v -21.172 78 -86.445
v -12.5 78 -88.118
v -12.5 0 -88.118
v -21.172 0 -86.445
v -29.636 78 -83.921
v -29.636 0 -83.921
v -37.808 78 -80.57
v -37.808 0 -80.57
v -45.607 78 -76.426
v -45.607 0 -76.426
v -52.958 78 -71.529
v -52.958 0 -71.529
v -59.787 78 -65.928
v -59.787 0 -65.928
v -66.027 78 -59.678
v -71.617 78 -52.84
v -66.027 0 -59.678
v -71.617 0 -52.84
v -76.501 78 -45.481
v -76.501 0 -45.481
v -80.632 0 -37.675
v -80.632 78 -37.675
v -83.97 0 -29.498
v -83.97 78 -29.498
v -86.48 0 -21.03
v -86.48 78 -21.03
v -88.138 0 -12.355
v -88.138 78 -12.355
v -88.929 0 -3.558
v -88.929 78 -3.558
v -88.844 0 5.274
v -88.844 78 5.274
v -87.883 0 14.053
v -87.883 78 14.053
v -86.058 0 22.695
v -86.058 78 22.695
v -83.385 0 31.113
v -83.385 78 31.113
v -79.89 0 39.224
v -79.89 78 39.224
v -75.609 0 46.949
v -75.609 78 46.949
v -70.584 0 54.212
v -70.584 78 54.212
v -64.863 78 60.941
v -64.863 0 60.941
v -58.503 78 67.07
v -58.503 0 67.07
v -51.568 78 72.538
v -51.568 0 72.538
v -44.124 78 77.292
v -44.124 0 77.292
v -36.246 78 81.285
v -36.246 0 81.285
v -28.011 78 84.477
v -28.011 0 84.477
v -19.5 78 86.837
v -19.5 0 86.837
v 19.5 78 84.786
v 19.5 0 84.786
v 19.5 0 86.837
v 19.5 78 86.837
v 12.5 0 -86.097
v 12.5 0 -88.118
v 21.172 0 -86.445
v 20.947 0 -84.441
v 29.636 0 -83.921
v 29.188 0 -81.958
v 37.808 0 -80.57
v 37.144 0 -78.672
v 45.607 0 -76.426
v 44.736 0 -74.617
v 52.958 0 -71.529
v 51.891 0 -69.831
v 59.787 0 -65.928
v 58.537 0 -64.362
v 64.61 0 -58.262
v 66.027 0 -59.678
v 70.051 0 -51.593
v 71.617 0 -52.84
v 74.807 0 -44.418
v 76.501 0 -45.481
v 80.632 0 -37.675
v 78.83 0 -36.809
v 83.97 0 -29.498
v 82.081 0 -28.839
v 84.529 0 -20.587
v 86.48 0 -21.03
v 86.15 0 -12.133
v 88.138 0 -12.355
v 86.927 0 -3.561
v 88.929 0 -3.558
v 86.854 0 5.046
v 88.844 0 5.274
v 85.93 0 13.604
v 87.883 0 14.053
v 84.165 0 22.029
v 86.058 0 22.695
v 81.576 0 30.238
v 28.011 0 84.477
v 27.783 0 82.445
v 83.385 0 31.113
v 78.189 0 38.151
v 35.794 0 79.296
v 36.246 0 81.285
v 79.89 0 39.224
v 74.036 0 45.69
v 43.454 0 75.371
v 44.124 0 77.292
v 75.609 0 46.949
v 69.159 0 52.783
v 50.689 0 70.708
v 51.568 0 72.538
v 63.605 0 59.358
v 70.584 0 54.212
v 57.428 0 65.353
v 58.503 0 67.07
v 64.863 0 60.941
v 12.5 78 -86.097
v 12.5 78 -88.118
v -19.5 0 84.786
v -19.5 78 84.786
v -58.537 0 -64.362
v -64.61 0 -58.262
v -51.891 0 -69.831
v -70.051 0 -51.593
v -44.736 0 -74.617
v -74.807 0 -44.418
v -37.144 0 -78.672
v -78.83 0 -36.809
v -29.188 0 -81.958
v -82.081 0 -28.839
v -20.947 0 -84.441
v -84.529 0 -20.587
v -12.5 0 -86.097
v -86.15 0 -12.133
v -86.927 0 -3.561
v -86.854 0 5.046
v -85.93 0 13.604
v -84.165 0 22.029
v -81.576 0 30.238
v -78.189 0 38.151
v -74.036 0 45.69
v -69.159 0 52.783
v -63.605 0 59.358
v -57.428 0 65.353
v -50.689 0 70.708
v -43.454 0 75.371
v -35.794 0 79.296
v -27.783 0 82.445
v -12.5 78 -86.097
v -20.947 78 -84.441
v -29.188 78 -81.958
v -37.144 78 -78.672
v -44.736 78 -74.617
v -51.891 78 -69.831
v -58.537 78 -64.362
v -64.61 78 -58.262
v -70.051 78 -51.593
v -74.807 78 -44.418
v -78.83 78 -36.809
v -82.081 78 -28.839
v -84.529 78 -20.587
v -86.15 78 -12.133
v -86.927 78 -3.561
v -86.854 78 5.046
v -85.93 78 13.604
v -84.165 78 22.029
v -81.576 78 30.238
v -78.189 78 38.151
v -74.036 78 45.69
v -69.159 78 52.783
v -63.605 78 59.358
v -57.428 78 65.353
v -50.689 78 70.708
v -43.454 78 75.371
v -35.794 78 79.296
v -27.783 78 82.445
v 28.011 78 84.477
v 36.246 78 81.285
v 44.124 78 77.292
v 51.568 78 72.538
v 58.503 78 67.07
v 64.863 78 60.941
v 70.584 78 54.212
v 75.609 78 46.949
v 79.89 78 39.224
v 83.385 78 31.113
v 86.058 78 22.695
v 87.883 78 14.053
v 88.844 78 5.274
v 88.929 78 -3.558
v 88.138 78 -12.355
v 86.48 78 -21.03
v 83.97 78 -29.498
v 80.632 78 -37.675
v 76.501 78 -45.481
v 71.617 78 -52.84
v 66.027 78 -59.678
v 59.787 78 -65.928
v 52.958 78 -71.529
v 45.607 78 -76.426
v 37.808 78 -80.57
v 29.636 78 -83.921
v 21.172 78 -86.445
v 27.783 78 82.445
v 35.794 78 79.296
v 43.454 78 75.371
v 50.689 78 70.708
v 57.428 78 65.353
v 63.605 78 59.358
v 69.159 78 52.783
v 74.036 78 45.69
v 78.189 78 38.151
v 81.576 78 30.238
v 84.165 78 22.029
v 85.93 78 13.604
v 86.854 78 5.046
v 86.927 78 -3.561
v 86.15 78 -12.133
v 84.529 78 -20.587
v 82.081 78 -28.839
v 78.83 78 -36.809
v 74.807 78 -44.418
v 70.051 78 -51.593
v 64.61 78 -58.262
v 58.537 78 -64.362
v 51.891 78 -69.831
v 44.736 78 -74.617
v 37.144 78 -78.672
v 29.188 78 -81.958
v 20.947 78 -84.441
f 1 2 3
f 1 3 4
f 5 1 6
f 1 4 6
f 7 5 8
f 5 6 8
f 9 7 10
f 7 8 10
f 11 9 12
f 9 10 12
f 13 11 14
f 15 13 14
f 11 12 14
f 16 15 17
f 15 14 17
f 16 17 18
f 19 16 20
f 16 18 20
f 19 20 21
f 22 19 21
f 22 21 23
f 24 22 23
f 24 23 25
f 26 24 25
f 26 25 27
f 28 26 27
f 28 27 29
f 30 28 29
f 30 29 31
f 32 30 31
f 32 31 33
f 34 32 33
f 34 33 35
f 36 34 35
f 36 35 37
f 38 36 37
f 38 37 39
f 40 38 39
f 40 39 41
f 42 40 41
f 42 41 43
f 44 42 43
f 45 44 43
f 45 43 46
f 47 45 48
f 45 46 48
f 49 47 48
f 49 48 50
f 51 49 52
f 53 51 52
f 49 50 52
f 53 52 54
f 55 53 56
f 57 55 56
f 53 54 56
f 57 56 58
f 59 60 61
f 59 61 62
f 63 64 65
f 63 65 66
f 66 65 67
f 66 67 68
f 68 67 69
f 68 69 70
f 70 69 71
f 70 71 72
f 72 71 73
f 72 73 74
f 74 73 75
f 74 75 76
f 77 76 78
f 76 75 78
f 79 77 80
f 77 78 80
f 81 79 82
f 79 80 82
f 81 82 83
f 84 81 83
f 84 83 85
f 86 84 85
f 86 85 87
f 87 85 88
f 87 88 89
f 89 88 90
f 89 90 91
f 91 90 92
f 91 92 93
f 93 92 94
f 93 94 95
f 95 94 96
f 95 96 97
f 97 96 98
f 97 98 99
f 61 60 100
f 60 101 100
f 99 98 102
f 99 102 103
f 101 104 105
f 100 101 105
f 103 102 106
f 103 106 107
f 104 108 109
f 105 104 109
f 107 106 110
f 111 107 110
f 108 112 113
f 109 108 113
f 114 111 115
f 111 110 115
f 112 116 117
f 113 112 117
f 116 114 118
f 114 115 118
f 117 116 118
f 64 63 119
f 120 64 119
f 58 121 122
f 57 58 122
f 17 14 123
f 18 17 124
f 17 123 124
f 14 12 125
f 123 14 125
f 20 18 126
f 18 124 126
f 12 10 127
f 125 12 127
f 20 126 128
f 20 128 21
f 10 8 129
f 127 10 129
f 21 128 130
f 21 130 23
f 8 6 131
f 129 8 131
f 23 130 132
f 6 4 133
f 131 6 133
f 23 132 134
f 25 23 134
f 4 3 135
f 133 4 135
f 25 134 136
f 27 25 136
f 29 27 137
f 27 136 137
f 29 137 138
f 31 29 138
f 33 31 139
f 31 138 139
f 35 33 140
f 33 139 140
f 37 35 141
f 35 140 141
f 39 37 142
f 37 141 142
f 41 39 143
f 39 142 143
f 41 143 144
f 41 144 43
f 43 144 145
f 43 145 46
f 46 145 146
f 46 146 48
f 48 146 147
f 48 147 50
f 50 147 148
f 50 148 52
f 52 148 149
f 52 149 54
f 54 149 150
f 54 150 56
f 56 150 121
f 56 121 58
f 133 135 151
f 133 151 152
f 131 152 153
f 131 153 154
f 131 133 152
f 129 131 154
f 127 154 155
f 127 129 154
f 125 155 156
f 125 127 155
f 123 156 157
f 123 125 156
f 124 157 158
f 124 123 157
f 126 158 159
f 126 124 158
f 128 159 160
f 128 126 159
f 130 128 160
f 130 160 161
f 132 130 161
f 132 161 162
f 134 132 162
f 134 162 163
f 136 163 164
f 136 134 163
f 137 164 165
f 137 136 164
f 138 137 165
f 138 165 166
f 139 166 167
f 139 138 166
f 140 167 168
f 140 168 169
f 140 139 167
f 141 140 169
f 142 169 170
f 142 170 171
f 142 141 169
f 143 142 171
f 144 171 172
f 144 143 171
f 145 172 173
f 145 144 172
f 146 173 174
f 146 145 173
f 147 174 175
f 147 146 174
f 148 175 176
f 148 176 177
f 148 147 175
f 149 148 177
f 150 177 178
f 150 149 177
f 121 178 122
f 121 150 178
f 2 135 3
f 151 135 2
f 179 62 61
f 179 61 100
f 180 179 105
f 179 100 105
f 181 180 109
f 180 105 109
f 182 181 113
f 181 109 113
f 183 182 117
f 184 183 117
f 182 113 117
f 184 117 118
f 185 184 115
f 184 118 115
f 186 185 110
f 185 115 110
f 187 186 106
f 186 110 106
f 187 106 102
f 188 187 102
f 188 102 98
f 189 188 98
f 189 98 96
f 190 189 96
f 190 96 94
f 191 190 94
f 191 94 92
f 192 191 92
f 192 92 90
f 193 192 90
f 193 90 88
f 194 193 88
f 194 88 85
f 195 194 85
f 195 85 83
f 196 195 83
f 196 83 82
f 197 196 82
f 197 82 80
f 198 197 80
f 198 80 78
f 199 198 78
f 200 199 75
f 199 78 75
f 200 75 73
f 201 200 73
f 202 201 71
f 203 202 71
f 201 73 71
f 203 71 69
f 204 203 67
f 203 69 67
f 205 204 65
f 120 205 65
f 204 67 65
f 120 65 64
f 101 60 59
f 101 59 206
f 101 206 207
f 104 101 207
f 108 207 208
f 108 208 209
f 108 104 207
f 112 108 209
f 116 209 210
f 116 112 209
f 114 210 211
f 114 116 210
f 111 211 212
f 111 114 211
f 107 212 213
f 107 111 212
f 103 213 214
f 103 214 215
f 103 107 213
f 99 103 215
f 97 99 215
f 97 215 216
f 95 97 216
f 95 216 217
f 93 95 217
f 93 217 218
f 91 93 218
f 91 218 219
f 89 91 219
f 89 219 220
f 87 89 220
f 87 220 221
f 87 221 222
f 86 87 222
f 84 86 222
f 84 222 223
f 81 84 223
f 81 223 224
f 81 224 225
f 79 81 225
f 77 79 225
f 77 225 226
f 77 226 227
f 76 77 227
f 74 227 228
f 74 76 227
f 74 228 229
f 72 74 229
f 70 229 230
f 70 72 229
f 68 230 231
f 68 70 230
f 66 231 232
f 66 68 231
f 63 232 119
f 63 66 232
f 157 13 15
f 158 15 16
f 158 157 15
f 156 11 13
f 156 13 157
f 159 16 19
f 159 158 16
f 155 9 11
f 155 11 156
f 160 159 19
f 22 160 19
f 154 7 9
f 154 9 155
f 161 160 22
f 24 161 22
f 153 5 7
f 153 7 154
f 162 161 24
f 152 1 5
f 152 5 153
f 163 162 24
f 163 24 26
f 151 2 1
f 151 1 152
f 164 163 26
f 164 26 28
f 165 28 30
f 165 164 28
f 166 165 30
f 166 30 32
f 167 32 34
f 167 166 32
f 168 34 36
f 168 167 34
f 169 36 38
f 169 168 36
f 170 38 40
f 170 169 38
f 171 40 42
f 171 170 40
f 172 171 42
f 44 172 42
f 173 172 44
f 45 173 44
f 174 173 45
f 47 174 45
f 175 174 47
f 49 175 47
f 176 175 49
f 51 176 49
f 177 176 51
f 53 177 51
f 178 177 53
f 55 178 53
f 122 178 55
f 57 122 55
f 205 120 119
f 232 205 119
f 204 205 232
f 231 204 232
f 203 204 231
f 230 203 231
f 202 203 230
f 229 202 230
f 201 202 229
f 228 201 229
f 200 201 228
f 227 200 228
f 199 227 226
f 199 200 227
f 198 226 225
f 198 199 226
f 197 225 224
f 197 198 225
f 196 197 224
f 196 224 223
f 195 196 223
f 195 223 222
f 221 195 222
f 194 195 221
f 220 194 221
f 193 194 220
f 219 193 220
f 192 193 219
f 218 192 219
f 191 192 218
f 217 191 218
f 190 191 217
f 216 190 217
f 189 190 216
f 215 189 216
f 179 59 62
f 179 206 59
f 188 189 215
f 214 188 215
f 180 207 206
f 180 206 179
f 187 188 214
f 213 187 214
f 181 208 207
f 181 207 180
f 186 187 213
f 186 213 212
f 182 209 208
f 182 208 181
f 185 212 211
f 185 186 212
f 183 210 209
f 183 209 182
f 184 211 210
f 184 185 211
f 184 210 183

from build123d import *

# Parameters (mm, degrees)
SKETCH1_R           = 89
SKETCH1_R_2         = 87
BOSS_EXTRUDE1_DEPTH = 78
SKETCH2_W           = 25
SKETCH2_H           = 78
CUT_EXTRUDE1_DEPTH  = 100
SKETCH3_W           = 39
SKETCH3_H           = 78
CUT_EXTRUDE2_DEPTH  = 208


with BuildPart() as part:
    # Sketch1 → Boss-Extrude1 (new body)
    with BuildSketch(Plane(origin=(0, 0, 0), x_dir=(1, 0, 0), z_dir=(0, 1, 0))):
        with Locations(Location((0, 0, 0), (0, 0, 270))):
            Circle(SKETCH1_R)
        with Locations(Location((0, 0, 0), (0, 0, 270))):
            Circle(SKETCH1_R_2, mode=Mode.SUBTRACT)
    extrude(amount=BOSS_EXTRUDE1_DEPTH)

    # Sketch2 → Cut-Extrude1 (cut)
    with BuildSketch(Plane.XY):
        with Locations((0, 39)):
            Rectangle(SKETCH2_W, SKETCH2_H)
    extrude(amount=-CUT_EXTRUDE1_DEPTH, mode=Mode.SUBTRACT)

    # Sketch3 → Cut-Extrude2 (cut)
    with BuildSketch(Plane.XY):
        with Locations((0, 39)):
            Rectangle(SKETCH3_W, SKETCH3_H)
    extrude(amount=CUT_EXTRUDE2_DEPTH, mode=Mode.SUBTRACT)


with BuildPart() as cut_extrude2_piece_1:
    # of the separate pieces the step leaves, piece 1, a body of its own (cut_extrude2_pieces)
    add(part.part.solids().sort_by_distance((-12.5, 0, -86.097328646))[0])


with BuildPart() as cut_extrude2_piece_2:
    # of the separate pieces the step leaves, piece 2, a body of its own (cut_extrude2_pieces)
    add(part.part.solids().sort_by_distance((19.5, 0, 86.837491903))[0])


solid = Compound([cut_extrude2_piece_1.part, cut_extrude2_piece_2.part])
